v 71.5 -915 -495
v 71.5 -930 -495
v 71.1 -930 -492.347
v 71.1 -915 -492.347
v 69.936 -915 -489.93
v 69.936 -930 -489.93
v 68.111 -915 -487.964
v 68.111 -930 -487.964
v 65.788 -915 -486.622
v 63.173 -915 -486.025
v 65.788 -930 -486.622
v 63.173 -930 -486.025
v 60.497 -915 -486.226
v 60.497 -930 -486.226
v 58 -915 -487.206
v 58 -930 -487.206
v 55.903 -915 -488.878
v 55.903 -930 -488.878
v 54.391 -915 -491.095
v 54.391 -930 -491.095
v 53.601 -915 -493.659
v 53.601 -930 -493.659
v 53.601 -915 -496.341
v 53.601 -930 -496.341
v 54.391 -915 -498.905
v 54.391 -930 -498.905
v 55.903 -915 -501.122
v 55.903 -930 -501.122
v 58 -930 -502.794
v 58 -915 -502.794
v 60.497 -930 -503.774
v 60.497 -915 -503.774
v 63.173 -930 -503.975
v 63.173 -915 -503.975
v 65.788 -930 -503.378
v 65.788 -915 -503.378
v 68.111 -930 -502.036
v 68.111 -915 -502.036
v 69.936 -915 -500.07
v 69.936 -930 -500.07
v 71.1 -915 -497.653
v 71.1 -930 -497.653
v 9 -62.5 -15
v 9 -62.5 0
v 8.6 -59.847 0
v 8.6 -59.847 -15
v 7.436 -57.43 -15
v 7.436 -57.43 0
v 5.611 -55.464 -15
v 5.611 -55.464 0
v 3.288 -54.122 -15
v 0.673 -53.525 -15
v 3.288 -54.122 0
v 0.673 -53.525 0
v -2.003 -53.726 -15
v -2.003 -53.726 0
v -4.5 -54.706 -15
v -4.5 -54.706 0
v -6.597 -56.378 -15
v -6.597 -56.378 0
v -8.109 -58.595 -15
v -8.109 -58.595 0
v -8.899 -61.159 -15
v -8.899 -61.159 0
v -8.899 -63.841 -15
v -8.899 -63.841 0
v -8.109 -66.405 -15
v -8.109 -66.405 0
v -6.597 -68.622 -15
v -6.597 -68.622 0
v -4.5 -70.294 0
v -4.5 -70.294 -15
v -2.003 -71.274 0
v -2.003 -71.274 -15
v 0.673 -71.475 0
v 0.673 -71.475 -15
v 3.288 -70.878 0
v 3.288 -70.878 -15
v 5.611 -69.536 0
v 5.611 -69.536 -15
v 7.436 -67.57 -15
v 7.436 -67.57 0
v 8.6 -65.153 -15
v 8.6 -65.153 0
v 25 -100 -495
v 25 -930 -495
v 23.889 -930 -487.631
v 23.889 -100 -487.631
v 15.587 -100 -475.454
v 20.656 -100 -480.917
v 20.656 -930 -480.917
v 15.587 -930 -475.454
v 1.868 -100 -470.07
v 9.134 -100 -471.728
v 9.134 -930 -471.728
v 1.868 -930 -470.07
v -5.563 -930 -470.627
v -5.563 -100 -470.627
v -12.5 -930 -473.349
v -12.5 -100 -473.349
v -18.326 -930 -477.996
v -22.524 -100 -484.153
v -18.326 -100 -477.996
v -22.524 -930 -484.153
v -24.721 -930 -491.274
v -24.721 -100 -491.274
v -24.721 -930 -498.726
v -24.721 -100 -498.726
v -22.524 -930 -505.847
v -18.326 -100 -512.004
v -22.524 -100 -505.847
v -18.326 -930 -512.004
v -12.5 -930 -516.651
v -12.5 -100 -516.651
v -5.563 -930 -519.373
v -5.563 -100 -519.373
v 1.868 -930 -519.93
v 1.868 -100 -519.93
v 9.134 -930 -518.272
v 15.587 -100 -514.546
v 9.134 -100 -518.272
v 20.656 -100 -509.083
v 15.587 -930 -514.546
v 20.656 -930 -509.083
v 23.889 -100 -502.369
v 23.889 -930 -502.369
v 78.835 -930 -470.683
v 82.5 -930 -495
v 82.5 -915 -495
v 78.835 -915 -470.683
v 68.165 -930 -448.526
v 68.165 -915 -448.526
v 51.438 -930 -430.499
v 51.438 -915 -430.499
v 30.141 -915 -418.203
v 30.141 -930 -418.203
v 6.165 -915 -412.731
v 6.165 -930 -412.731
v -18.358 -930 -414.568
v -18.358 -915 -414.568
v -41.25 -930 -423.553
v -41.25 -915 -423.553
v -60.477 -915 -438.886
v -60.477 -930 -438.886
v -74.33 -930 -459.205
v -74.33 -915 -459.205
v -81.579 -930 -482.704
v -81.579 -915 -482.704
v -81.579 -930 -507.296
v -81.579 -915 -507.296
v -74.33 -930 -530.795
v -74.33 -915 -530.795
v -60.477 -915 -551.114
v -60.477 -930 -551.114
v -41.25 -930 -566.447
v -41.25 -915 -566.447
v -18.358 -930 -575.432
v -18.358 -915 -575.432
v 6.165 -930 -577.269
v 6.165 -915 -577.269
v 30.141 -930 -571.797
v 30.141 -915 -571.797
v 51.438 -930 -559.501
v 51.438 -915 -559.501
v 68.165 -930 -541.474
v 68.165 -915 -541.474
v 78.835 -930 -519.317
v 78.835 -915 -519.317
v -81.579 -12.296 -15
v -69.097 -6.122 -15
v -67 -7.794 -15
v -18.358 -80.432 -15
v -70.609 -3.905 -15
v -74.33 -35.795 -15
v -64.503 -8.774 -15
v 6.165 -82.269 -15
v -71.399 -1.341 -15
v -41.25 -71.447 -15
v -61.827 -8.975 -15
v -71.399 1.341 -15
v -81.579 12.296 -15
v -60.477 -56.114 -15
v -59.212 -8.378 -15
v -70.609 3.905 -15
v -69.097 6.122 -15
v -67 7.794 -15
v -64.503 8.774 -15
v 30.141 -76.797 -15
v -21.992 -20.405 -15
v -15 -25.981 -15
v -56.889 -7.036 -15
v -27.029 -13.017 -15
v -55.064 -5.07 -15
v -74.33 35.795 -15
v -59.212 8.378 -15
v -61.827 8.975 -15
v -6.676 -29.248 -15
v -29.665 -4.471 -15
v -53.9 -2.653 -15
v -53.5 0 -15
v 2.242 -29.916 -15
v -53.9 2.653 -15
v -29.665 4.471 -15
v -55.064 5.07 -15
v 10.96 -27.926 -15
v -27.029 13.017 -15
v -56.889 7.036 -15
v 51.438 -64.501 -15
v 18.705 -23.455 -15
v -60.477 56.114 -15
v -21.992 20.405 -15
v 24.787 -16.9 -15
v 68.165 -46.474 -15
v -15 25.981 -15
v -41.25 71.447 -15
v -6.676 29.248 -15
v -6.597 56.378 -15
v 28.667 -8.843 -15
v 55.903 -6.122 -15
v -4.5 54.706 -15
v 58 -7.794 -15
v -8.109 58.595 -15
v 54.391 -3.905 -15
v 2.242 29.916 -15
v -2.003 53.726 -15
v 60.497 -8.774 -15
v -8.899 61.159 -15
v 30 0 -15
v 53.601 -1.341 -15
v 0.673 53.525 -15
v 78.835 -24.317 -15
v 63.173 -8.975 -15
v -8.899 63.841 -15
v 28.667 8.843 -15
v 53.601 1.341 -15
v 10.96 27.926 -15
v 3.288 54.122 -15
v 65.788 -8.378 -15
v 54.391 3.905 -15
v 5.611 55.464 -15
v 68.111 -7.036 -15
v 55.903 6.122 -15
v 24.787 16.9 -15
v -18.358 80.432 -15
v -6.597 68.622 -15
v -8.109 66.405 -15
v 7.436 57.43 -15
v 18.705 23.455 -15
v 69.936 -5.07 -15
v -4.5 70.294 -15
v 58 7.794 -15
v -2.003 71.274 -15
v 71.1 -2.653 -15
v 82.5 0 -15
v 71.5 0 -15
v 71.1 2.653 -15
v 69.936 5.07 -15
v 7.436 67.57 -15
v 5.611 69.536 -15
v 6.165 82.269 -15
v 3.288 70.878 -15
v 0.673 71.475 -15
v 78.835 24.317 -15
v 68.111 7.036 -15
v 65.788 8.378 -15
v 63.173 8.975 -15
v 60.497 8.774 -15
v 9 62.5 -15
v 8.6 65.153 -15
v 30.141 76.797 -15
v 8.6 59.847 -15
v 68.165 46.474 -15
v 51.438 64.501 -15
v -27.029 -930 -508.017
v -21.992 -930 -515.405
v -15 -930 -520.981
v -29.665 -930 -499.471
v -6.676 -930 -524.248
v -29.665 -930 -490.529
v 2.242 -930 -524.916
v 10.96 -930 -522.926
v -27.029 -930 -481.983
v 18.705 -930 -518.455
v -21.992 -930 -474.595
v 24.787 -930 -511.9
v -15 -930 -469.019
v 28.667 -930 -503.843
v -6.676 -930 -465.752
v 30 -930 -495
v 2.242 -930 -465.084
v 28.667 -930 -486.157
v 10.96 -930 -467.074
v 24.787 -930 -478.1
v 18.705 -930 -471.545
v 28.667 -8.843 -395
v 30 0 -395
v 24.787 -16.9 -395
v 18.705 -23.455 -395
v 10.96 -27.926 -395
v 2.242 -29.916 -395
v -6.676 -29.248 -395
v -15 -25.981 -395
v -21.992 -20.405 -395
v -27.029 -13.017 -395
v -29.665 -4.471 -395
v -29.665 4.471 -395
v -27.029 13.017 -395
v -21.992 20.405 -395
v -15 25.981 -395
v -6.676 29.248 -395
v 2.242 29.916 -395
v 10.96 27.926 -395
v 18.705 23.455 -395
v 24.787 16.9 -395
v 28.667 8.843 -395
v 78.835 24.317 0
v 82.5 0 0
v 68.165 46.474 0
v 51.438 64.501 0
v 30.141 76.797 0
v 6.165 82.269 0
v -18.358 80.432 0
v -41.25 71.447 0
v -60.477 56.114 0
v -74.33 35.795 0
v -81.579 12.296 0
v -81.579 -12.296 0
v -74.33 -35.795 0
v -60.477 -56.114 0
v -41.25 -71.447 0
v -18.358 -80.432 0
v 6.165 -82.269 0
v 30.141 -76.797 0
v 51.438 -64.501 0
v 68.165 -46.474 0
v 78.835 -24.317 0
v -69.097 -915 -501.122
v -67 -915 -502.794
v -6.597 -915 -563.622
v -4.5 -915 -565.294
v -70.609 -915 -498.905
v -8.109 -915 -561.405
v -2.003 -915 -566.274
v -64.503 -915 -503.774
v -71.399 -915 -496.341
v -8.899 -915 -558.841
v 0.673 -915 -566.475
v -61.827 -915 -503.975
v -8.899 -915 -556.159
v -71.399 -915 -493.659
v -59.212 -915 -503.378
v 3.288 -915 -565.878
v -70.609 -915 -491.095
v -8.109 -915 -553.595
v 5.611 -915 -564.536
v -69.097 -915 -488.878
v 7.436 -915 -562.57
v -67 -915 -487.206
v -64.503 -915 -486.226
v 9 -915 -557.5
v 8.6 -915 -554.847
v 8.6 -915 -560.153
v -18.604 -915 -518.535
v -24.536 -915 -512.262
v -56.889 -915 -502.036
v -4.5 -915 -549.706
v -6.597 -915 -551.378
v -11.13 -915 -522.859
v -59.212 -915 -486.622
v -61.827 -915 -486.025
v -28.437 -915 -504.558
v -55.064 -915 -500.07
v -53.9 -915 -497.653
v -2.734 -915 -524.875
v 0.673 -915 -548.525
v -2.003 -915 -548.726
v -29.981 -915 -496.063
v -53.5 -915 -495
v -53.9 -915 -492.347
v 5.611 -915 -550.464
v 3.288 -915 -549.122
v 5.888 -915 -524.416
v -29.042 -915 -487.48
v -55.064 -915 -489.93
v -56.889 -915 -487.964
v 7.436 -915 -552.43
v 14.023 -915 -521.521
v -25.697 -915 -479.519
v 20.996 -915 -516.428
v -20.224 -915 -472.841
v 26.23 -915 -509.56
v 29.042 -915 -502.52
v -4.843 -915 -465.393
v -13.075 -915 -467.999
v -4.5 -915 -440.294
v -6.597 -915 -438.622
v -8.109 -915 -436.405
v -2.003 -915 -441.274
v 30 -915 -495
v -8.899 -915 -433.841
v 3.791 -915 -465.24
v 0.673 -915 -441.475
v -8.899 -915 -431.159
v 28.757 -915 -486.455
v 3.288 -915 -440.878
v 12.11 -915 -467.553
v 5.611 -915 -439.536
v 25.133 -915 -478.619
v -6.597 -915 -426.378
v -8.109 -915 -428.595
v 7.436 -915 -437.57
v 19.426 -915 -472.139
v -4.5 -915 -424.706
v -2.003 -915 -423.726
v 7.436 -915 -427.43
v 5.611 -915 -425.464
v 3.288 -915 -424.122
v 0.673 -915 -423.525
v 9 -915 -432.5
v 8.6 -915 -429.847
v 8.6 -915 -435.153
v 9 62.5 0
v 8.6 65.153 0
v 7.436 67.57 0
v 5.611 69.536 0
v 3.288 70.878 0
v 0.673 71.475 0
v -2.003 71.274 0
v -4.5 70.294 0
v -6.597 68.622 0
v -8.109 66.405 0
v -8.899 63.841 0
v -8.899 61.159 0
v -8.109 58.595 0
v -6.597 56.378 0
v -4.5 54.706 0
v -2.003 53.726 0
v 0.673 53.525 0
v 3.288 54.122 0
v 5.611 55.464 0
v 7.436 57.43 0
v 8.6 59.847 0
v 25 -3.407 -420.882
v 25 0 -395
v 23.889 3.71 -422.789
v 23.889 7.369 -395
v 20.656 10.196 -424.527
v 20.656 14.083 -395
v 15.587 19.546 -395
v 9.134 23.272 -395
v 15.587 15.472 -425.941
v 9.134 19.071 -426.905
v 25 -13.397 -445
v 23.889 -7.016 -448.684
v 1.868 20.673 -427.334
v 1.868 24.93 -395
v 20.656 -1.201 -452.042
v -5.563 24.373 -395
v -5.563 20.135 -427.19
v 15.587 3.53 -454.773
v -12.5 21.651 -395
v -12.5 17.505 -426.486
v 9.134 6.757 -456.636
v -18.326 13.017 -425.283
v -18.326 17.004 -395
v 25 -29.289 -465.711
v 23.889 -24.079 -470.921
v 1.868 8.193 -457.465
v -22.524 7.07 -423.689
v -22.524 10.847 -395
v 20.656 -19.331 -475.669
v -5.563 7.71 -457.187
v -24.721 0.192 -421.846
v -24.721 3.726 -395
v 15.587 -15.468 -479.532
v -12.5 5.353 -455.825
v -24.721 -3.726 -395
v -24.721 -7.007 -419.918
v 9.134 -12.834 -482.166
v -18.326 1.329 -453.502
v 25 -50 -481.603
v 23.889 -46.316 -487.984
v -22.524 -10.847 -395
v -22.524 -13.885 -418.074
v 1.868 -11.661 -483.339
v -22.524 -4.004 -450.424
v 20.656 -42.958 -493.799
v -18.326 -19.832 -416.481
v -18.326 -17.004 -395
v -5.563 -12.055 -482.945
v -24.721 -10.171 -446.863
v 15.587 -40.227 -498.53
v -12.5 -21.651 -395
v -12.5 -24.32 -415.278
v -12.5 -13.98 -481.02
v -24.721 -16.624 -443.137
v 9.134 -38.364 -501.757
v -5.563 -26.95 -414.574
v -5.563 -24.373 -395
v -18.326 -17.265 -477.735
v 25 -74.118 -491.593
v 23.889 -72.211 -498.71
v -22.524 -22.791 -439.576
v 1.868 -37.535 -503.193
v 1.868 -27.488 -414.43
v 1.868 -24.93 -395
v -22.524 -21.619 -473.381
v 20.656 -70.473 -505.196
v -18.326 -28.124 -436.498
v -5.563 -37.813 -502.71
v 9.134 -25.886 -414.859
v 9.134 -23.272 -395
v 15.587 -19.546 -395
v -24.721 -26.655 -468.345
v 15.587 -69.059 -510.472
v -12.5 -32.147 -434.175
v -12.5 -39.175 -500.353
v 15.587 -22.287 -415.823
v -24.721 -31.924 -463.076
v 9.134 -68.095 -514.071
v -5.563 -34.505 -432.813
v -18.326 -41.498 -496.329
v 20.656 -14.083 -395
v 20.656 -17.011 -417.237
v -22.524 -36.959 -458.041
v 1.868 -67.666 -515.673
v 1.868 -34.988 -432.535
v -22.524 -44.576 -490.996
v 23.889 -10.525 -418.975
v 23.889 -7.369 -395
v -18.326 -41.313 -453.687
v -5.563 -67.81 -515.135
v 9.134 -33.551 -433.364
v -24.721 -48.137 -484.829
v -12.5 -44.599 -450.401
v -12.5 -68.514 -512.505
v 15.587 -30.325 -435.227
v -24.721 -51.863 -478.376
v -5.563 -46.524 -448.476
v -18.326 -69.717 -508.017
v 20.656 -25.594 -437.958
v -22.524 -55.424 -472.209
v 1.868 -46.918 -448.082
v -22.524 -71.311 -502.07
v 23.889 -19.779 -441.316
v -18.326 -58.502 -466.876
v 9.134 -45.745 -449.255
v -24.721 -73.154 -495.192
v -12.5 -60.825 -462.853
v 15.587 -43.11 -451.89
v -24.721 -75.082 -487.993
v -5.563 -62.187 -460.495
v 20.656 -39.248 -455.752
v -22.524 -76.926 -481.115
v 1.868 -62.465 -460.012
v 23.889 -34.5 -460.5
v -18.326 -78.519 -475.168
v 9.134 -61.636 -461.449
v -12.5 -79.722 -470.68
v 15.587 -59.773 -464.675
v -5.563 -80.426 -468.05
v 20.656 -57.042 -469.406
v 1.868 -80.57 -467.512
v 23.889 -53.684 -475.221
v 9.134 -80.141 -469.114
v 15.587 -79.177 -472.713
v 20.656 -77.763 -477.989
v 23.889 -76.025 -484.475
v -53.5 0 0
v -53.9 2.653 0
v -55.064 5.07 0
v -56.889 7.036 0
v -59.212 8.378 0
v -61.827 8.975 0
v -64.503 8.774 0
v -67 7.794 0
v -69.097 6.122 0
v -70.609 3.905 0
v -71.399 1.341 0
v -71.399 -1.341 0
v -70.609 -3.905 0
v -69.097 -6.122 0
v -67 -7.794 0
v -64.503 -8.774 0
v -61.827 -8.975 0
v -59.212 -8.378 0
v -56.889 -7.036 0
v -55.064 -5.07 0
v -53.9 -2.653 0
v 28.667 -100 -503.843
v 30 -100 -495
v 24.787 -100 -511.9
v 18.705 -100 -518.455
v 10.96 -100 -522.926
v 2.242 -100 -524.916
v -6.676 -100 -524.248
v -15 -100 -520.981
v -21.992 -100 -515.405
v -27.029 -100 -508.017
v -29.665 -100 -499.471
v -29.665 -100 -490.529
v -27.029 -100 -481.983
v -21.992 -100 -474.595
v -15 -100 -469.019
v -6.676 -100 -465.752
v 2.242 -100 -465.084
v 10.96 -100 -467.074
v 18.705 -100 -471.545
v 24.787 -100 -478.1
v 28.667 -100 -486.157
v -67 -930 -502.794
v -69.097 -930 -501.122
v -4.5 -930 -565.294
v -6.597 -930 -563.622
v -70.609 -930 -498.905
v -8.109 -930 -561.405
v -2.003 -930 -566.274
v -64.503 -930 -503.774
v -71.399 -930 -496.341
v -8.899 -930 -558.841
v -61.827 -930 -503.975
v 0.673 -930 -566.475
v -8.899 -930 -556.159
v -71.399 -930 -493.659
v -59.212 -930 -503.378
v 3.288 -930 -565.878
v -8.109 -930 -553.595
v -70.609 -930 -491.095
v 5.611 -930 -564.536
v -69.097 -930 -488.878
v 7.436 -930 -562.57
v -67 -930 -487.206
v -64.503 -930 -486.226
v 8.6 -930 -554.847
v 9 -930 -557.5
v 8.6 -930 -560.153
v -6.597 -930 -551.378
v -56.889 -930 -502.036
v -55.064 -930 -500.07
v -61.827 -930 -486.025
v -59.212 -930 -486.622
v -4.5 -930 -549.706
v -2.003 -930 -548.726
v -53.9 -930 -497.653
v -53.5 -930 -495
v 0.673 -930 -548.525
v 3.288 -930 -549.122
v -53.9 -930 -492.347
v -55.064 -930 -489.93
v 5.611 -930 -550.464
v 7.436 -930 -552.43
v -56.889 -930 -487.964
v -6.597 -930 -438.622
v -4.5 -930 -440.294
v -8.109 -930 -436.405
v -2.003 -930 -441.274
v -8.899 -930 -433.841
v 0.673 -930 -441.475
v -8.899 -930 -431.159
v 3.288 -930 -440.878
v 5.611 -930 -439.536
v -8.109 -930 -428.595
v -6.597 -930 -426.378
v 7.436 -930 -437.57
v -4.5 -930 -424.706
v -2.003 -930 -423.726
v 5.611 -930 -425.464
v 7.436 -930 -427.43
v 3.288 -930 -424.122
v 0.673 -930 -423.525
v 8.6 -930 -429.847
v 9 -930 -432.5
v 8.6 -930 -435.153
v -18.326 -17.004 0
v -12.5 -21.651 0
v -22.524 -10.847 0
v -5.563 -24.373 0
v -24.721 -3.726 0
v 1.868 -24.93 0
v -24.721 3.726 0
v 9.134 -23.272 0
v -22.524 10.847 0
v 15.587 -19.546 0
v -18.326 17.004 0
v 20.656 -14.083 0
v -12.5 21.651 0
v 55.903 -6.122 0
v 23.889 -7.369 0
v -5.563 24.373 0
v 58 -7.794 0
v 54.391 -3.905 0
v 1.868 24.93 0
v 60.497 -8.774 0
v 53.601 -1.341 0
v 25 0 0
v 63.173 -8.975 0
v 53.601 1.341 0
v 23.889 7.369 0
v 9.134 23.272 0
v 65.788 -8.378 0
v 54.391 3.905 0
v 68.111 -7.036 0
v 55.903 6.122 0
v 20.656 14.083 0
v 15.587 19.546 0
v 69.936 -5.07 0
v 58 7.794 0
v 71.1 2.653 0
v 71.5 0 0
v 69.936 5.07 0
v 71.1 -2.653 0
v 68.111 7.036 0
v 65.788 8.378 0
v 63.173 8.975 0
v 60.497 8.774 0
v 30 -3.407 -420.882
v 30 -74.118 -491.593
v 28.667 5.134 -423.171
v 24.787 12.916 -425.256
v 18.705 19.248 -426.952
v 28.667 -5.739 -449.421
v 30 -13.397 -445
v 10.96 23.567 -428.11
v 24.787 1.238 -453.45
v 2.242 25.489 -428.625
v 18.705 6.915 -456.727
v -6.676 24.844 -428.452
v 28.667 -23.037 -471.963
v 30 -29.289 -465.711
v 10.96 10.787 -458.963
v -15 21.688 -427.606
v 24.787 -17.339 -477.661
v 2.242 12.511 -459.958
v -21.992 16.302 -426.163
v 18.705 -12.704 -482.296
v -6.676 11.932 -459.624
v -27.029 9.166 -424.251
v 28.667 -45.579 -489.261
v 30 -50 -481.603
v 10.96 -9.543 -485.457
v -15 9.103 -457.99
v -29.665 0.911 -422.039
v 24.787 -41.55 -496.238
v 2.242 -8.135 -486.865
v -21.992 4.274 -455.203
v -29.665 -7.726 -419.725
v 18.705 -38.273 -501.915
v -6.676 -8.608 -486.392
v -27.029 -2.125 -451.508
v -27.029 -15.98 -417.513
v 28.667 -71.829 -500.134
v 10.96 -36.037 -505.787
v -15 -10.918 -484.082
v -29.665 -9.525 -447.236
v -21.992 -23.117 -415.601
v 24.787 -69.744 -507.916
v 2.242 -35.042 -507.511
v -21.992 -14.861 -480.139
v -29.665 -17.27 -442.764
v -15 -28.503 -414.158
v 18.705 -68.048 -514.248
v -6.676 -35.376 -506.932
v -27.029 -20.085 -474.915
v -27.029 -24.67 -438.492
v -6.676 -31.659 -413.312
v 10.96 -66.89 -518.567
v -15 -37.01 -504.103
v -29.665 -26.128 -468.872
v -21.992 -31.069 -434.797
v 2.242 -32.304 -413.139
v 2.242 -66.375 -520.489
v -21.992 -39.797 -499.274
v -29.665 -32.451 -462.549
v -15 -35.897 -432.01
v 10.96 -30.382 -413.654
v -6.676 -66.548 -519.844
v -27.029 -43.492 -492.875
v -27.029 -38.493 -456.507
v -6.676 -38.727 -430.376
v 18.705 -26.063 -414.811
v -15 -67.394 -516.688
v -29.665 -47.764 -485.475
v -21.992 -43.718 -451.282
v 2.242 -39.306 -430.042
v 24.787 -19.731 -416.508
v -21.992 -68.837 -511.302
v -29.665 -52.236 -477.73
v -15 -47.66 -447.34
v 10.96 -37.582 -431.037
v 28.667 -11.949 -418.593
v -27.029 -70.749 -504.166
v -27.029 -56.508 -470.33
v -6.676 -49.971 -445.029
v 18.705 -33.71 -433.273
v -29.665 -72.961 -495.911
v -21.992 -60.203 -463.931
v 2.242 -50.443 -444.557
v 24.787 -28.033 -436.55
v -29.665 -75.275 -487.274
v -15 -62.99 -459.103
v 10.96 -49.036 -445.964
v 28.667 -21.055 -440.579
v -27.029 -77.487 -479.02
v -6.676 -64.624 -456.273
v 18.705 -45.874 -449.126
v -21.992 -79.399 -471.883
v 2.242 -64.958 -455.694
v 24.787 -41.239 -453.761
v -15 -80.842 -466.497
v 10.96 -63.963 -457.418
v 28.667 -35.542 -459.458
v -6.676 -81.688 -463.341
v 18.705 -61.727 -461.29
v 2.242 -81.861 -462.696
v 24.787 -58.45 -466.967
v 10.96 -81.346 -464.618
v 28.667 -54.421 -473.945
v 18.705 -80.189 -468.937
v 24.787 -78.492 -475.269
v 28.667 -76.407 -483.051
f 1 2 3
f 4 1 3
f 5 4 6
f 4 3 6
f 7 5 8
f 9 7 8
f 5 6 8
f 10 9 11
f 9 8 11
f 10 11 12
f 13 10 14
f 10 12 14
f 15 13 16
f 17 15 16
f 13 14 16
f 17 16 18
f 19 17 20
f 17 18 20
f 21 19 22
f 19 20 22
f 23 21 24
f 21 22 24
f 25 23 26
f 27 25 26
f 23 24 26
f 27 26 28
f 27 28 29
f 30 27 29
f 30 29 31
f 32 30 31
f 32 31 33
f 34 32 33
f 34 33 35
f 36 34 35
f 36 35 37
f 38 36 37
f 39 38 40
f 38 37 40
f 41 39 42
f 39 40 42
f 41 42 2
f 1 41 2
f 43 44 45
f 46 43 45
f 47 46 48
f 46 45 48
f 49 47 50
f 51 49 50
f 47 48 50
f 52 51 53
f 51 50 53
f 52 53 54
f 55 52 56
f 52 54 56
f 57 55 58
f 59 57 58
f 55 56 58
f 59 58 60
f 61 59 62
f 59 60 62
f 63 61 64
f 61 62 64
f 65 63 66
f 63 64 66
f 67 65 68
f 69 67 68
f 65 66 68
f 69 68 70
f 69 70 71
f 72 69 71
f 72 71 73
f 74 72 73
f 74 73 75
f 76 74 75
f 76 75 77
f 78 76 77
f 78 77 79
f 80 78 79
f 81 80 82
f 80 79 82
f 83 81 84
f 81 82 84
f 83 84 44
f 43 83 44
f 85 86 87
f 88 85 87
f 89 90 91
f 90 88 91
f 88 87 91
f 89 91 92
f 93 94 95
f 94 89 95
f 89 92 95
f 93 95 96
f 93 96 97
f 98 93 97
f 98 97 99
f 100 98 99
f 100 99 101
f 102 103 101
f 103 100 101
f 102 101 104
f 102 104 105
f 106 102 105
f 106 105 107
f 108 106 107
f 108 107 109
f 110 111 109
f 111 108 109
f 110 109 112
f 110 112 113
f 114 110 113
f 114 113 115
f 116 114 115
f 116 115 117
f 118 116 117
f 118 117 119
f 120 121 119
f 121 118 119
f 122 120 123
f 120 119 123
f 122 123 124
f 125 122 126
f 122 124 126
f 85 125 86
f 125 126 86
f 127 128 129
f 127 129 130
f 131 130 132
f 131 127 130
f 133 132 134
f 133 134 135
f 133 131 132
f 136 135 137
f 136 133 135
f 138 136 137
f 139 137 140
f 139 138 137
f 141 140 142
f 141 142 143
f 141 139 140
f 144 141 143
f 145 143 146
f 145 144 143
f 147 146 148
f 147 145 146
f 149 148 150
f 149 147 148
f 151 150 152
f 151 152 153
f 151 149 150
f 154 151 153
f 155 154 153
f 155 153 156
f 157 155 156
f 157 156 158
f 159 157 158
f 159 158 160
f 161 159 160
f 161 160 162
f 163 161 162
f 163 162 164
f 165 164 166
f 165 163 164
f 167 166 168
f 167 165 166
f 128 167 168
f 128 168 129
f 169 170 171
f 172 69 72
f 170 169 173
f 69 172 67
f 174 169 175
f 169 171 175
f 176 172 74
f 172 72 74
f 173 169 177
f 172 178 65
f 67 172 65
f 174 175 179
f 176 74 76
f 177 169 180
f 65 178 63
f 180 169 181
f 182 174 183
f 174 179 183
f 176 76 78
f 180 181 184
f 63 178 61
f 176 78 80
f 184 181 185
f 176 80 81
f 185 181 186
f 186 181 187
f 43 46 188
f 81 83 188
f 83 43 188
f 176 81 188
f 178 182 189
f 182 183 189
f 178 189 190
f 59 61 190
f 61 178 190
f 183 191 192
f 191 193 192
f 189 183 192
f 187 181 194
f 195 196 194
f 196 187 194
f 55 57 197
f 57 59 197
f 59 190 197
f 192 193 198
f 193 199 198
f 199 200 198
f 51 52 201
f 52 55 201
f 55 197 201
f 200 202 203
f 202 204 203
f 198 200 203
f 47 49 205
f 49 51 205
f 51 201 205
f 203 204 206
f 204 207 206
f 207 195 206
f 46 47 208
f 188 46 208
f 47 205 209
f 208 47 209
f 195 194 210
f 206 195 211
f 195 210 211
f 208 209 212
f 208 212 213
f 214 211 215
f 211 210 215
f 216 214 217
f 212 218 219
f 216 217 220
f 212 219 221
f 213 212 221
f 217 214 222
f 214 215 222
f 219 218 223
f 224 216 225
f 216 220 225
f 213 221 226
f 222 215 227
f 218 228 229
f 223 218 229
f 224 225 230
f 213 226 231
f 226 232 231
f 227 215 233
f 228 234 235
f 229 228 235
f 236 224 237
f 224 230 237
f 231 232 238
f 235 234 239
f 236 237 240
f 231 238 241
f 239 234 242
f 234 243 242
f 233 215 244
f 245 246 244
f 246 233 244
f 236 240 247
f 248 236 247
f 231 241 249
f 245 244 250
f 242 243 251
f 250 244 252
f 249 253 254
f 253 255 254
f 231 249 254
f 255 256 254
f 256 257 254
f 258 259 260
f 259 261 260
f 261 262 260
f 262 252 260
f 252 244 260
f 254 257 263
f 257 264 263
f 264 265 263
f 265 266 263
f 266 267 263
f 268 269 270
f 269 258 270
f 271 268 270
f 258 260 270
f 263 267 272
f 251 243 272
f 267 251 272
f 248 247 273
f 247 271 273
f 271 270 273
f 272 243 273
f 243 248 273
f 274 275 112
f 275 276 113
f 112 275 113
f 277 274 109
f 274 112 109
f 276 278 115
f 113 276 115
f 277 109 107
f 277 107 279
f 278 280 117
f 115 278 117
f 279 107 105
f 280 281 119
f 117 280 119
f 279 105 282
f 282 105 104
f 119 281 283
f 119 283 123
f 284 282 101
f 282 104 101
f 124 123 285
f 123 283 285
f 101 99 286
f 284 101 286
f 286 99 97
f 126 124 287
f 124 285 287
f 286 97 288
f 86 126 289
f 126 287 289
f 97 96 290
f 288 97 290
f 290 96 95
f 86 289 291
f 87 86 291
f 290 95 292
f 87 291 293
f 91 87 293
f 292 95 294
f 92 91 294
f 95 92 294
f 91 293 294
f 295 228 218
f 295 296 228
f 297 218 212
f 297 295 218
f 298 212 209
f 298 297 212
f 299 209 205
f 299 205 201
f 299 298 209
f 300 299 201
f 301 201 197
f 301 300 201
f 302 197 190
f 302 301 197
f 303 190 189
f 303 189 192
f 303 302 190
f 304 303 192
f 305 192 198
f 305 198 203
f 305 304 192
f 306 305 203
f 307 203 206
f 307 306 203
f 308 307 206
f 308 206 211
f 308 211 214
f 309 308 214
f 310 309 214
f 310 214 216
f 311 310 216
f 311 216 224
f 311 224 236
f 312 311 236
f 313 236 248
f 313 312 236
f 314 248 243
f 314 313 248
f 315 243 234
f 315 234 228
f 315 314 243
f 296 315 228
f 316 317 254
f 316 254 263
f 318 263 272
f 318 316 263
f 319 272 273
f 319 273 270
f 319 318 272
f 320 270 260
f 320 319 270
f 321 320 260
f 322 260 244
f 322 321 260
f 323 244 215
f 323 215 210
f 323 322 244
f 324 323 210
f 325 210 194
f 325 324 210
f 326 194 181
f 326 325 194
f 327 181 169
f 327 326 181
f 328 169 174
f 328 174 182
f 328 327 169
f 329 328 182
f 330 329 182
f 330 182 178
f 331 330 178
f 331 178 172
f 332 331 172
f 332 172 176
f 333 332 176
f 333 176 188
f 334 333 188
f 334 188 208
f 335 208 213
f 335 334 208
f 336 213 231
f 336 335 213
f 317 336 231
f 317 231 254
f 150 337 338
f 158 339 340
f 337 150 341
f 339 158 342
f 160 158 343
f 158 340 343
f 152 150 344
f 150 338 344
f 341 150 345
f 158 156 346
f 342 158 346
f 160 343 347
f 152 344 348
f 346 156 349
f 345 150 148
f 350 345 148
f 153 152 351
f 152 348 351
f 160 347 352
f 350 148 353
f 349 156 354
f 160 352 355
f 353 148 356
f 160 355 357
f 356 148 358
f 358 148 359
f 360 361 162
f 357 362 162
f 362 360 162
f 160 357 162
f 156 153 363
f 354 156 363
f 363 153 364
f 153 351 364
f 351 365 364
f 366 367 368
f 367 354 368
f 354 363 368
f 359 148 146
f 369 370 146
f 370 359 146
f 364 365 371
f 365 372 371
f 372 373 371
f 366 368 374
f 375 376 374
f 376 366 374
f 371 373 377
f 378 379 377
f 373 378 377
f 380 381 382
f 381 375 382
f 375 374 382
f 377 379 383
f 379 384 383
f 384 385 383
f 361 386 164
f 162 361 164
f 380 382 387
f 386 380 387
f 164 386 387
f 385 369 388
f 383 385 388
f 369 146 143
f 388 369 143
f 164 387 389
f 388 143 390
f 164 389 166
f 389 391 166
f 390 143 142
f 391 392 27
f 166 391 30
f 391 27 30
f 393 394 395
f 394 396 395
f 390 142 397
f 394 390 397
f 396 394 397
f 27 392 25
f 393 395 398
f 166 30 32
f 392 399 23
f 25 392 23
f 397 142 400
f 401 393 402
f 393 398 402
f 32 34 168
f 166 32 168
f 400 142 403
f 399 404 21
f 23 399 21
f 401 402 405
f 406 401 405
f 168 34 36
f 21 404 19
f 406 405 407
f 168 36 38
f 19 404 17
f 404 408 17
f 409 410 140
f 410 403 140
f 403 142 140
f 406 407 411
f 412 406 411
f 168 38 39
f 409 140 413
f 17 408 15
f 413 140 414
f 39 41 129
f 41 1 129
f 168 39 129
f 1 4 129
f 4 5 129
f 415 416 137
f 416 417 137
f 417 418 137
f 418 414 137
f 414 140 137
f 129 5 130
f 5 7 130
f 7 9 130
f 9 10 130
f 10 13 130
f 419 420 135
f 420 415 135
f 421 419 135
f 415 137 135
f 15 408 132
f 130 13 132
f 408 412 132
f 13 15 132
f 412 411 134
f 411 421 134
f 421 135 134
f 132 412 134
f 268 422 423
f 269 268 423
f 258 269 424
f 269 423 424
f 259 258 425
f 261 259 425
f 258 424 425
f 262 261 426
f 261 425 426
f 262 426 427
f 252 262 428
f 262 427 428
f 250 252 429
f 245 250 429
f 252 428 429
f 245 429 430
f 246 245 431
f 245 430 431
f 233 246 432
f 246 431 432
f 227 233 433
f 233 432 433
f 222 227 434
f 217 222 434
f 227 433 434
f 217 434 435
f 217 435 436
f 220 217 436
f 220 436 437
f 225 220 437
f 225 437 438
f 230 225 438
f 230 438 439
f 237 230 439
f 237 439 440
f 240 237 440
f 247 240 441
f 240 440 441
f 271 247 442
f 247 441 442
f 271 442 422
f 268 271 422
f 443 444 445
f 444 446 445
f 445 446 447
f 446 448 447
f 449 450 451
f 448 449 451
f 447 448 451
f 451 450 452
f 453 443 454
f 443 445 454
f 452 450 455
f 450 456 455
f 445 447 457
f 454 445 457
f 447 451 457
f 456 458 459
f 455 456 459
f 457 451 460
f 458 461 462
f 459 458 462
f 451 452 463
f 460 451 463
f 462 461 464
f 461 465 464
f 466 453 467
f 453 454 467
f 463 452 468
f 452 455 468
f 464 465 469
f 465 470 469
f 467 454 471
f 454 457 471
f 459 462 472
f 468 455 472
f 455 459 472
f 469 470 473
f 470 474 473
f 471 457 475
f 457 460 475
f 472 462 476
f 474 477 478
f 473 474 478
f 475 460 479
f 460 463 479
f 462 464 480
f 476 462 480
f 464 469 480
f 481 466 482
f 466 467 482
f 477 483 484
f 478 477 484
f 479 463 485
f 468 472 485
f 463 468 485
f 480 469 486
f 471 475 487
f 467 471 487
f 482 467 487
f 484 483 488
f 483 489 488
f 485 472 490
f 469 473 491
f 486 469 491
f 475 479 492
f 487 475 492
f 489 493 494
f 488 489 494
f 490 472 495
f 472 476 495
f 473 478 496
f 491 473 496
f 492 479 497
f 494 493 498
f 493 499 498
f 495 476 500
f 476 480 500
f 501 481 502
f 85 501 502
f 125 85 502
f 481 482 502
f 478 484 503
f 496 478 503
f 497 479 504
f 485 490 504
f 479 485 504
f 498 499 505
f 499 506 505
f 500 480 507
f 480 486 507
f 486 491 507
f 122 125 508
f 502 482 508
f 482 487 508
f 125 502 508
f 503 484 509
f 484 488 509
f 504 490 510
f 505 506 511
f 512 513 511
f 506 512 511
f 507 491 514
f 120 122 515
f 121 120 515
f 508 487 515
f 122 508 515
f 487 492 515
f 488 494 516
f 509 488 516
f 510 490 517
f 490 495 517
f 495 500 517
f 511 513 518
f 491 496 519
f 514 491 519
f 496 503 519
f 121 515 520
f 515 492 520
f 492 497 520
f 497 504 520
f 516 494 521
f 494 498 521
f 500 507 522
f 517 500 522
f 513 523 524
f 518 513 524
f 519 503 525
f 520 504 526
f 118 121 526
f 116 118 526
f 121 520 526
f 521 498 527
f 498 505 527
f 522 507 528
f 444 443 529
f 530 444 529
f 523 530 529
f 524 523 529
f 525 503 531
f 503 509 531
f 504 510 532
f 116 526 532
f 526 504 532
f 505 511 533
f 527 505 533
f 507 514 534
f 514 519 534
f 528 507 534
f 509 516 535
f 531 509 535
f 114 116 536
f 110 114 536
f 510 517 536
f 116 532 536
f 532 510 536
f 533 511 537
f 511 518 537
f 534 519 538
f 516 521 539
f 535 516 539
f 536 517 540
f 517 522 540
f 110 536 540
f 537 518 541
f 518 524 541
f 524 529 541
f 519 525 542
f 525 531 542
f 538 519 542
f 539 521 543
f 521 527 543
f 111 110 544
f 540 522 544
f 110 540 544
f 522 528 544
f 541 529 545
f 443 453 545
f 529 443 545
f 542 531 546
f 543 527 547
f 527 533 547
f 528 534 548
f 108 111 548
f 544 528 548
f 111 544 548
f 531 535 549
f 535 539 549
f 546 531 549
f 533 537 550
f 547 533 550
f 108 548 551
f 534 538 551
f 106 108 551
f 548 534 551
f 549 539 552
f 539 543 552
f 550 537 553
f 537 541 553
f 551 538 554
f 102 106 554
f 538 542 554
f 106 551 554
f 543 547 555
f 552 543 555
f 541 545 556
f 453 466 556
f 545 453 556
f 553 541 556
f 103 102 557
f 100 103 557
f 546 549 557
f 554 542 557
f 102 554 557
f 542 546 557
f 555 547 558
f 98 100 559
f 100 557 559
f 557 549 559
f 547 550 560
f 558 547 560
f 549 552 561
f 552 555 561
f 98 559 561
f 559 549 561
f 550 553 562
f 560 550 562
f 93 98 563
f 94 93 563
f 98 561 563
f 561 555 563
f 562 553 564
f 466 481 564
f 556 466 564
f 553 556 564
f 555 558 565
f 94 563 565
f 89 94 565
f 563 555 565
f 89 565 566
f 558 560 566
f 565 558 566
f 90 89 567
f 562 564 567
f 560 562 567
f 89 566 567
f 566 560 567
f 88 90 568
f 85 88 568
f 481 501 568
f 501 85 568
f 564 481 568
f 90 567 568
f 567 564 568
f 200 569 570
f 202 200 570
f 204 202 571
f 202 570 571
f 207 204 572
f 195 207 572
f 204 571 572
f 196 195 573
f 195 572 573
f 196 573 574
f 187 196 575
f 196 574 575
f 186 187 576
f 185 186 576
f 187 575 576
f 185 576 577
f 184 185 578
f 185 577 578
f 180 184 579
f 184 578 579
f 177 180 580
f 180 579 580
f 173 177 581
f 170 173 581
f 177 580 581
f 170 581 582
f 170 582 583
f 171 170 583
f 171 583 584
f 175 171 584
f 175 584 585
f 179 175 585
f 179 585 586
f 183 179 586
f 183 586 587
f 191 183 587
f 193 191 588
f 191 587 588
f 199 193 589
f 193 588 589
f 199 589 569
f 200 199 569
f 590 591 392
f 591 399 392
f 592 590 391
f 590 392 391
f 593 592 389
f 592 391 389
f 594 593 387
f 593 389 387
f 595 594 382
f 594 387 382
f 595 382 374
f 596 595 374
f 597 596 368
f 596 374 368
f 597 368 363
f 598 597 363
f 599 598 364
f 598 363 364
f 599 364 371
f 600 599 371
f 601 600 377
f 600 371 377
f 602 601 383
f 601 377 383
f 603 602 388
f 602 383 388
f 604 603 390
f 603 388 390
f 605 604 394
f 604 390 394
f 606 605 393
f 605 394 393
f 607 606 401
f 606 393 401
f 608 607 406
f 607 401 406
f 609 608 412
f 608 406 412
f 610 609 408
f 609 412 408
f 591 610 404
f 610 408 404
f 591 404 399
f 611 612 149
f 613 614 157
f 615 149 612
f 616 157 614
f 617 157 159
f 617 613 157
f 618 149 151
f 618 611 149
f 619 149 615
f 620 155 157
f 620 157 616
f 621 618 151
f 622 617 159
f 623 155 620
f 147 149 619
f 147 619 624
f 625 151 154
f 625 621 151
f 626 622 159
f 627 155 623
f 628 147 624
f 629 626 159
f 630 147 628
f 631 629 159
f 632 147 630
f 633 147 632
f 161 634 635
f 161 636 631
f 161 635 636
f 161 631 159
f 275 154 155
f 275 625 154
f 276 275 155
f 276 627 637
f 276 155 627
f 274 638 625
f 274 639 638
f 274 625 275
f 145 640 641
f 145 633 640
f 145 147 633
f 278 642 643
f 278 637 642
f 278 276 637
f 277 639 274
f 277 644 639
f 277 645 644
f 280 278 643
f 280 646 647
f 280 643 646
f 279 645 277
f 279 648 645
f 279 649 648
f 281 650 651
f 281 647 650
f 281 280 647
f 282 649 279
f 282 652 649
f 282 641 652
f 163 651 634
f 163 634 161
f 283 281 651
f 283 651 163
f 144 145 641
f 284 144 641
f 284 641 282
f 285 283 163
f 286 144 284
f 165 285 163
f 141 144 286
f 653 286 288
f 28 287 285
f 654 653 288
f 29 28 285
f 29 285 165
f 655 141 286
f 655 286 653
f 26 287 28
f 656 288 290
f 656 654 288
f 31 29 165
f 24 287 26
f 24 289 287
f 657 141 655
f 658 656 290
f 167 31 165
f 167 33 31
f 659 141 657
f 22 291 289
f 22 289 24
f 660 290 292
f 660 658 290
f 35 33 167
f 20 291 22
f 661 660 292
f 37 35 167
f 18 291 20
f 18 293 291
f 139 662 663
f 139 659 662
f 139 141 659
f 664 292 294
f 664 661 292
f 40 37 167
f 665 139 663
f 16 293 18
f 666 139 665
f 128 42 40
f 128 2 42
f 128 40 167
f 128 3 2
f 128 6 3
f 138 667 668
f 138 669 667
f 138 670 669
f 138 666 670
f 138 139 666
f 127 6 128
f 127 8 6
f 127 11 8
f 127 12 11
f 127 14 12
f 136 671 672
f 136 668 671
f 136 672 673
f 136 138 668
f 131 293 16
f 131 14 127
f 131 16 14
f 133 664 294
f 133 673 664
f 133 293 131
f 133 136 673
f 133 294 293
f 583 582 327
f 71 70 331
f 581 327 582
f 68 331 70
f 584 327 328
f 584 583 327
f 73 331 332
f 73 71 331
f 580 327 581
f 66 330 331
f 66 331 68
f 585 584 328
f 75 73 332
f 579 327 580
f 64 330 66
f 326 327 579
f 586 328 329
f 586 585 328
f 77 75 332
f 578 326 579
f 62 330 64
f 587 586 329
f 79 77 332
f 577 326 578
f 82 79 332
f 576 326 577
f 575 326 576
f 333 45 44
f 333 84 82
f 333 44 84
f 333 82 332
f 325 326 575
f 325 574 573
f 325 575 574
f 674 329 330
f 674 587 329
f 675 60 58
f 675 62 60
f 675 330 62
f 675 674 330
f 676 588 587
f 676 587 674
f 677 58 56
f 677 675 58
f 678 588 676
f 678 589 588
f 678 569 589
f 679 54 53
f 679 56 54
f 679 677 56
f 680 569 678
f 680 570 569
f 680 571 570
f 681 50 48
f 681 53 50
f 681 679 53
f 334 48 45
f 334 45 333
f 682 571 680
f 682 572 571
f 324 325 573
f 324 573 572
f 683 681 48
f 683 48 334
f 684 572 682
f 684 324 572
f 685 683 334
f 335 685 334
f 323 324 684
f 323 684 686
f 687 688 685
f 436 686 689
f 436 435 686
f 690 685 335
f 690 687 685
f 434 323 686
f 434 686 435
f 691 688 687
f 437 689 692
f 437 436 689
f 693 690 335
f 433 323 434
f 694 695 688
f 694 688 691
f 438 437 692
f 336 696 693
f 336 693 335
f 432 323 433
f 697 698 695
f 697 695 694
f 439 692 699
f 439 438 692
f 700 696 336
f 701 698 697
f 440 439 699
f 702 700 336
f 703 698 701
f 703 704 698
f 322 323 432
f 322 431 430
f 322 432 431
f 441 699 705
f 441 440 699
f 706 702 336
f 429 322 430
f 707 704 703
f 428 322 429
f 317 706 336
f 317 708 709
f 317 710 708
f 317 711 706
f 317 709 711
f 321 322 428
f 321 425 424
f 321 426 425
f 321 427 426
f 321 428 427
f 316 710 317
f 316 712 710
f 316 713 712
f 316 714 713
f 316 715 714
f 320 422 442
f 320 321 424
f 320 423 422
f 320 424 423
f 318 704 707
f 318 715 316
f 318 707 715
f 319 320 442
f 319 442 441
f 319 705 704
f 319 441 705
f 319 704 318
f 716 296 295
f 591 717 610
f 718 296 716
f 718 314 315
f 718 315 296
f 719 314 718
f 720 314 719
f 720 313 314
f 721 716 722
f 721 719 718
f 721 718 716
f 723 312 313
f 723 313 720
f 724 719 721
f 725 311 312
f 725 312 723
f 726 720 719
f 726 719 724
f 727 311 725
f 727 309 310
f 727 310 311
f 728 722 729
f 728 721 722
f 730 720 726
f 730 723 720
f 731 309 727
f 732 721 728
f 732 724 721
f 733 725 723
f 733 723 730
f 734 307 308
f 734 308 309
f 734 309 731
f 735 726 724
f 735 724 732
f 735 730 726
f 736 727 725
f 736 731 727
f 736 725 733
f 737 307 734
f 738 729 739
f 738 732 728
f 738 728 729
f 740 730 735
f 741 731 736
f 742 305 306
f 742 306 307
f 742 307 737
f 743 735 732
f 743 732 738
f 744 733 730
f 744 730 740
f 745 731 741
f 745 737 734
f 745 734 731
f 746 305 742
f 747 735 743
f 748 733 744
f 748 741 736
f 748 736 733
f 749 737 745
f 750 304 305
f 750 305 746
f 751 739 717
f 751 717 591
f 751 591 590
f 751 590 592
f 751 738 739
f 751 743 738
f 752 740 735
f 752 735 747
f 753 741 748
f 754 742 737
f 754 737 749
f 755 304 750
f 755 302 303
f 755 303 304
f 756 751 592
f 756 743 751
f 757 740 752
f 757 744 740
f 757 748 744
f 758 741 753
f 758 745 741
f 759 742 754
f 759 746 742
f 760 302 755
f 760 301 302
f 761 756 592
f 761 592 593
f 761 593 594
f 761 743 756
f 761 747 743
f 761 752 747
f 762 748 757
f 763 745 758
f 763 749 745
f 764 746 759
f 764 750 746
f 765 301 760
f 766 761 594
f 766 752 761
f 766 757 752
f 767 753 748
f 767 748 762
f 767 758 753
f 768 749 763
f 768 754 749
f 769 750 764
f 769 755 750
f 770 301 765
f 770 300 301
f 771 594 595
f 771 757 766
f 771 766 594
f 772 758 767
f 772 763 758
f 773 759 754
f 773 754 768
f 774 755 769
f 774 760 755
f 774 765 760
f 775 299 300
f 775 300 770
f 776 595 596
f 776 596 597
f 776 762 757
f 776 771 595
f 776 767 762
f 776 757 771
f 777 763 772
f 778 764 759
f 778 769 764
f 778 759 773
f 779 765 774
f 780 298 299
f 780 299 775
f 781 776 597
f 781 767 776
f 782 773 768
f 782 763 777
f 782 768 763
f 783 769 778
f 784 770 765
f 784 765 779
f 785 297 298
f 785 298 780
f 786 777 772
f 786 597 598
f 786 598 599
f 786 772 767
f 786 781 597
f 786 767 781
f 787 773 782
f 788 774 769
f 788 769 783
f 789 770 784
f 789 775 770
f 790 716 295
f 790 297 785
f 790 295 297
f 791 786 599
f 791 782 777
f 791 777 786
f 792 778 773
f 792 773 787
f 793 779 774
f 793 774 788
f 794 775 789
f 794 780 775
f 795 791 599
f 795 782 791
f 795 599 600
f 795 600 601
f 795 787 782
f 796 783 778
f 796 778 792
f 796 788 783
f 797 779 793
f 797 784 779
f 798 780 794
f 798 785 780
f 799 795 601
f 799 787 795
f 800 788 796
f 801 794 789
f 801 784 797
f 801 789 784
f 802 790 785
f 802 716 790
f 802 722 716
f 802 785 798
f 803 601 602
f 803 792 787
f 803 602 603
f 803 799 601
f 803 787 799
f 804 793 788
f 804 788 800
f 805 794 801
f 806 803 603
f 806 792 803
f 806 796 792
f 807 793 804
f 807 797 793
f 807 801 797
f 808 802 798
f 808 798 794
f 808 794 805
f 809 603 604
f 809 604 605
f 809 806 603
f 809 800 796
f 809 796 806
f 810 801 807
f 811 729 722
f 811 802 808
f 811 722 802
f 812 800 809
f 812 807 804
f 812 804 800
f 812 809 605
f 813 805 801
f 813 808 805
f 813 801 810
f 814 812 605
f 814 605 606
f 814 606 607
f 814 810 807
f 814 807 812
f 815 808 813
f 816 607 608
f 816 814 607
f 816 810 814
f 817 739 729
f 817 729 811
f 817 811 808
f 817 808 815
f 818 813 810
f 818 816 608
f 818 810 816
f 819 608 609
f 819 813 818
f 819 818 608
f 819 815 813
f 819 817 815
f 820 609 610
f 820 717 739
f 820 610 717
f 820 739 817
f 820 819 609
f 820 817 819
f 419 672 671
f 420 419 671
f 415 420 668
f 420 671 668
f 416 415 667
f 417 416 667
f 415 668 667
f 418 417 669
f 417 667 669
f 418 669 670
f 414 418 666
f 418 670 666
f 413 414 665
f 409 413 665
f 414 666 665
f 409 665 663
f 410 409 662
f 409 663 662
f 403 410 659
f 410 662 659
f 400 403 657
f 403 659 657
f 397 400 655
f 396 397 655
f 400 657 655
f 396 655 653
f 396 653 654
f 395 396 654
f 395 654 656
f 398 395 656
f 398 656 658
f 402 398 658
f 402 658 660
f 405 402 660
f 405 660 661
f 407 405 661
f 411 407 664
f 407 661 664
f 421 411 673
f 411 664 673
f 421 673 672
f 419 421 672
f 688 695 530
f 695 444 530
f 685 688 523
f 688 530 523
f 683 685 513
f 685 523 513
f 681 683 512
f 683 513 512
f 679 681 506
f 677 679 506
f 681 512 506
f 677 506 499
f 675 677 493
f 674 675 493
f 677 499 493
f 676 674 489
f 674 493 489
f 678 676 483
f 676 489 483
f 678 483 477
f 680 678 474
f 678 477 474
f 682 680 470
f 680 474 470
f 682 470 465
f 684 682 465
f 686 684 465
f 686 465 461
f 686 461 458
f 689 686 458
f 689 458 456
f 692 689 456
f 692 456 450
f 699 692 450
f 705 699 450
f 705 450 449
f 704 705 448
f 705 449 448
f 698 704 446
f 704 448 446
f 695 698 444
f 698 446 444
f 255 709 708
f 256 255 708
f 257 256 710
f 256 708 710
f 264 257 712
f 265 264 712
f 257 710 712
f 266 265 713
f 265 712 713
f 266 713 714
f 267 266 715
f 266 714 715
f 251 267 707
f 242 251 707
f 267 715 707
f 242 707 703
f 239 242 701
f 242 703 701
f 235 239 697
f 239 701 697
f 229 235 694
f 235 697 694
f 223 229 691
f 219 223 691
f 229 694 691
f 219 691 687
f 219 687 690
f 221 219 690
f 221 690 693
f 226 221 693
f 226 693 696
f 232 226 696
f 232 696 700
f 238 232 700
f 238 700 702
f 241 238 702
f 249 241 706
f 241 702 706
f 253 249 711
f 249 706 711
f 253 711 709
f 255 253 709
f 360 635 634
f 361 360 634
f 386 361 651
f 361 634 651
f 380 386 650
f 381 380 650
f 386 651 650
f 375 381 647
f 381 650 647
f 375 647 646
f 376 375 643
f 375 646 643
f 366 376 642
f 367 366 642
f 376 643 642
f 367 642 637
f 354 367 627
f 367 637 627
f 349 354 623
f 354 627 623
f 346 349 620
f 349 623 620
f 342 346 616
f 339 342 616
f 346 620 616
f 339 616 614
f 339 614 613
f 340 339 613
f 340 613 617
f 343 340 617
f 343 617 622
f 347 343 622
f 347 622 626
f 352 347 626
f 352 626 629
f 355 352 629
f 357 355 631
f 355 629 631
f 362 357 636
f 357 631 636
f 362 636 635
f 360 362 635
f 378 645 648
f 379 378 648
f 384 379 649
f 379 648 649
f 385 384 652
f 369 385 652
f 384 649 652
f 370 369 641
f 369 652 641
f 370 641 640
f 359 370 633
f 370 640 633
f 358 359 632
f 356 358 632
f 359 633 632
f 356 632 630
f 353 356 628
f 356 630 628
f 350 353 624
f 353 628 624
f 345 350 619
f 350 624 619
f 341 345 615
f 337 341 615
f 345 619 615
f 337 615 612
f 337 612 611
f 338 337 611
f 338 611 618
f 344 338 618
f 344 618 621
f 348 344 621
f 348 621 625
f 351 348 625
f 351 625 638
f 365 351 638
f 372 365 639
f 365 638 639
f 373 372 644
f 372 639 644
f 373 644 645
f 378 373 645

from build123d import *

# Parameters (mm, degrees)
F1_R     = 30
F1_R_2   = 25
F3_R     = 82.5
F3_R_2   = 9
F3_R_3   = 25
F4_DEPTH = 15
F5_R     = 82.5
F5_R_2   = 9
F5_R_3   = 25
F6_DEPTH = 15


with BuildPart() as f2:
    # F2: sweep along a path in F0
    with BuildLine(Plane.YZ) as f2_path:
        Line((0, 0), (0, -395))
        ThreePointArc((0, -395), (-29.289322, -465.710678), (-100, -495))
        Line((-100, -495), (-930, -495))
    # F1 (on Top) → F2 (sweep)
    with BuildSketch(Plane.XY):
        Circle(F1_R)
        Circle(F1_R_2, mode=Mode.SUBTRACT)
    sweep(path=f2_path.line)

    # F3 (on Top) → F4 (join)
    with BuildSketch(Plane.XY):
        Circle(F3_R)
        with Locations((0, -62.5)):
            Circle(F3_R_2, mode=Mode.SUBTRACT)
        with Locations((-62.5, 0)):
            Circle(F3_R_2, mode=Mode.SUBTRACT)
        Circle(F3_R_3, mode=Mode.SUBTRACT)
        with Locations((62.5, 0)):
            Circle(F3_R_2, mode=Mode.SUBTRACT)
        with Locations((0, 62.5)):
            Circle(F3_R_2, mode=Mode.SUBTRACT)
    extrude(amount=-F4_DEPTH)

    # F5 (on face) → F6 (join)
    with BuildSketch(Plane.XZ.offset(930)):
        with Locations((0, -495)):
            Circle(F5_R)
        with Locations((-62.5, -495)):
            Circle(F5_R_2, mode=Mode.SUBTRACT)
        with Locations((0, -557.5)):
            Circle(F5_R_2, mode=Mode.SUBTRACT)
        with Locations((0, -495)):
            Circle(F5_R_3, mode=Mode.SUBTRACT)
        with Locations((0, -432.5)):
            Circle(F5_R_2, mode=Mode.SUBTRACT)
        with Locations((62.5, -495)):
            Circle(F5_R_2, mode=Mode.SUBTRACT)
    extrude(amount=-F6_DEPTH)


solid = f2.part
